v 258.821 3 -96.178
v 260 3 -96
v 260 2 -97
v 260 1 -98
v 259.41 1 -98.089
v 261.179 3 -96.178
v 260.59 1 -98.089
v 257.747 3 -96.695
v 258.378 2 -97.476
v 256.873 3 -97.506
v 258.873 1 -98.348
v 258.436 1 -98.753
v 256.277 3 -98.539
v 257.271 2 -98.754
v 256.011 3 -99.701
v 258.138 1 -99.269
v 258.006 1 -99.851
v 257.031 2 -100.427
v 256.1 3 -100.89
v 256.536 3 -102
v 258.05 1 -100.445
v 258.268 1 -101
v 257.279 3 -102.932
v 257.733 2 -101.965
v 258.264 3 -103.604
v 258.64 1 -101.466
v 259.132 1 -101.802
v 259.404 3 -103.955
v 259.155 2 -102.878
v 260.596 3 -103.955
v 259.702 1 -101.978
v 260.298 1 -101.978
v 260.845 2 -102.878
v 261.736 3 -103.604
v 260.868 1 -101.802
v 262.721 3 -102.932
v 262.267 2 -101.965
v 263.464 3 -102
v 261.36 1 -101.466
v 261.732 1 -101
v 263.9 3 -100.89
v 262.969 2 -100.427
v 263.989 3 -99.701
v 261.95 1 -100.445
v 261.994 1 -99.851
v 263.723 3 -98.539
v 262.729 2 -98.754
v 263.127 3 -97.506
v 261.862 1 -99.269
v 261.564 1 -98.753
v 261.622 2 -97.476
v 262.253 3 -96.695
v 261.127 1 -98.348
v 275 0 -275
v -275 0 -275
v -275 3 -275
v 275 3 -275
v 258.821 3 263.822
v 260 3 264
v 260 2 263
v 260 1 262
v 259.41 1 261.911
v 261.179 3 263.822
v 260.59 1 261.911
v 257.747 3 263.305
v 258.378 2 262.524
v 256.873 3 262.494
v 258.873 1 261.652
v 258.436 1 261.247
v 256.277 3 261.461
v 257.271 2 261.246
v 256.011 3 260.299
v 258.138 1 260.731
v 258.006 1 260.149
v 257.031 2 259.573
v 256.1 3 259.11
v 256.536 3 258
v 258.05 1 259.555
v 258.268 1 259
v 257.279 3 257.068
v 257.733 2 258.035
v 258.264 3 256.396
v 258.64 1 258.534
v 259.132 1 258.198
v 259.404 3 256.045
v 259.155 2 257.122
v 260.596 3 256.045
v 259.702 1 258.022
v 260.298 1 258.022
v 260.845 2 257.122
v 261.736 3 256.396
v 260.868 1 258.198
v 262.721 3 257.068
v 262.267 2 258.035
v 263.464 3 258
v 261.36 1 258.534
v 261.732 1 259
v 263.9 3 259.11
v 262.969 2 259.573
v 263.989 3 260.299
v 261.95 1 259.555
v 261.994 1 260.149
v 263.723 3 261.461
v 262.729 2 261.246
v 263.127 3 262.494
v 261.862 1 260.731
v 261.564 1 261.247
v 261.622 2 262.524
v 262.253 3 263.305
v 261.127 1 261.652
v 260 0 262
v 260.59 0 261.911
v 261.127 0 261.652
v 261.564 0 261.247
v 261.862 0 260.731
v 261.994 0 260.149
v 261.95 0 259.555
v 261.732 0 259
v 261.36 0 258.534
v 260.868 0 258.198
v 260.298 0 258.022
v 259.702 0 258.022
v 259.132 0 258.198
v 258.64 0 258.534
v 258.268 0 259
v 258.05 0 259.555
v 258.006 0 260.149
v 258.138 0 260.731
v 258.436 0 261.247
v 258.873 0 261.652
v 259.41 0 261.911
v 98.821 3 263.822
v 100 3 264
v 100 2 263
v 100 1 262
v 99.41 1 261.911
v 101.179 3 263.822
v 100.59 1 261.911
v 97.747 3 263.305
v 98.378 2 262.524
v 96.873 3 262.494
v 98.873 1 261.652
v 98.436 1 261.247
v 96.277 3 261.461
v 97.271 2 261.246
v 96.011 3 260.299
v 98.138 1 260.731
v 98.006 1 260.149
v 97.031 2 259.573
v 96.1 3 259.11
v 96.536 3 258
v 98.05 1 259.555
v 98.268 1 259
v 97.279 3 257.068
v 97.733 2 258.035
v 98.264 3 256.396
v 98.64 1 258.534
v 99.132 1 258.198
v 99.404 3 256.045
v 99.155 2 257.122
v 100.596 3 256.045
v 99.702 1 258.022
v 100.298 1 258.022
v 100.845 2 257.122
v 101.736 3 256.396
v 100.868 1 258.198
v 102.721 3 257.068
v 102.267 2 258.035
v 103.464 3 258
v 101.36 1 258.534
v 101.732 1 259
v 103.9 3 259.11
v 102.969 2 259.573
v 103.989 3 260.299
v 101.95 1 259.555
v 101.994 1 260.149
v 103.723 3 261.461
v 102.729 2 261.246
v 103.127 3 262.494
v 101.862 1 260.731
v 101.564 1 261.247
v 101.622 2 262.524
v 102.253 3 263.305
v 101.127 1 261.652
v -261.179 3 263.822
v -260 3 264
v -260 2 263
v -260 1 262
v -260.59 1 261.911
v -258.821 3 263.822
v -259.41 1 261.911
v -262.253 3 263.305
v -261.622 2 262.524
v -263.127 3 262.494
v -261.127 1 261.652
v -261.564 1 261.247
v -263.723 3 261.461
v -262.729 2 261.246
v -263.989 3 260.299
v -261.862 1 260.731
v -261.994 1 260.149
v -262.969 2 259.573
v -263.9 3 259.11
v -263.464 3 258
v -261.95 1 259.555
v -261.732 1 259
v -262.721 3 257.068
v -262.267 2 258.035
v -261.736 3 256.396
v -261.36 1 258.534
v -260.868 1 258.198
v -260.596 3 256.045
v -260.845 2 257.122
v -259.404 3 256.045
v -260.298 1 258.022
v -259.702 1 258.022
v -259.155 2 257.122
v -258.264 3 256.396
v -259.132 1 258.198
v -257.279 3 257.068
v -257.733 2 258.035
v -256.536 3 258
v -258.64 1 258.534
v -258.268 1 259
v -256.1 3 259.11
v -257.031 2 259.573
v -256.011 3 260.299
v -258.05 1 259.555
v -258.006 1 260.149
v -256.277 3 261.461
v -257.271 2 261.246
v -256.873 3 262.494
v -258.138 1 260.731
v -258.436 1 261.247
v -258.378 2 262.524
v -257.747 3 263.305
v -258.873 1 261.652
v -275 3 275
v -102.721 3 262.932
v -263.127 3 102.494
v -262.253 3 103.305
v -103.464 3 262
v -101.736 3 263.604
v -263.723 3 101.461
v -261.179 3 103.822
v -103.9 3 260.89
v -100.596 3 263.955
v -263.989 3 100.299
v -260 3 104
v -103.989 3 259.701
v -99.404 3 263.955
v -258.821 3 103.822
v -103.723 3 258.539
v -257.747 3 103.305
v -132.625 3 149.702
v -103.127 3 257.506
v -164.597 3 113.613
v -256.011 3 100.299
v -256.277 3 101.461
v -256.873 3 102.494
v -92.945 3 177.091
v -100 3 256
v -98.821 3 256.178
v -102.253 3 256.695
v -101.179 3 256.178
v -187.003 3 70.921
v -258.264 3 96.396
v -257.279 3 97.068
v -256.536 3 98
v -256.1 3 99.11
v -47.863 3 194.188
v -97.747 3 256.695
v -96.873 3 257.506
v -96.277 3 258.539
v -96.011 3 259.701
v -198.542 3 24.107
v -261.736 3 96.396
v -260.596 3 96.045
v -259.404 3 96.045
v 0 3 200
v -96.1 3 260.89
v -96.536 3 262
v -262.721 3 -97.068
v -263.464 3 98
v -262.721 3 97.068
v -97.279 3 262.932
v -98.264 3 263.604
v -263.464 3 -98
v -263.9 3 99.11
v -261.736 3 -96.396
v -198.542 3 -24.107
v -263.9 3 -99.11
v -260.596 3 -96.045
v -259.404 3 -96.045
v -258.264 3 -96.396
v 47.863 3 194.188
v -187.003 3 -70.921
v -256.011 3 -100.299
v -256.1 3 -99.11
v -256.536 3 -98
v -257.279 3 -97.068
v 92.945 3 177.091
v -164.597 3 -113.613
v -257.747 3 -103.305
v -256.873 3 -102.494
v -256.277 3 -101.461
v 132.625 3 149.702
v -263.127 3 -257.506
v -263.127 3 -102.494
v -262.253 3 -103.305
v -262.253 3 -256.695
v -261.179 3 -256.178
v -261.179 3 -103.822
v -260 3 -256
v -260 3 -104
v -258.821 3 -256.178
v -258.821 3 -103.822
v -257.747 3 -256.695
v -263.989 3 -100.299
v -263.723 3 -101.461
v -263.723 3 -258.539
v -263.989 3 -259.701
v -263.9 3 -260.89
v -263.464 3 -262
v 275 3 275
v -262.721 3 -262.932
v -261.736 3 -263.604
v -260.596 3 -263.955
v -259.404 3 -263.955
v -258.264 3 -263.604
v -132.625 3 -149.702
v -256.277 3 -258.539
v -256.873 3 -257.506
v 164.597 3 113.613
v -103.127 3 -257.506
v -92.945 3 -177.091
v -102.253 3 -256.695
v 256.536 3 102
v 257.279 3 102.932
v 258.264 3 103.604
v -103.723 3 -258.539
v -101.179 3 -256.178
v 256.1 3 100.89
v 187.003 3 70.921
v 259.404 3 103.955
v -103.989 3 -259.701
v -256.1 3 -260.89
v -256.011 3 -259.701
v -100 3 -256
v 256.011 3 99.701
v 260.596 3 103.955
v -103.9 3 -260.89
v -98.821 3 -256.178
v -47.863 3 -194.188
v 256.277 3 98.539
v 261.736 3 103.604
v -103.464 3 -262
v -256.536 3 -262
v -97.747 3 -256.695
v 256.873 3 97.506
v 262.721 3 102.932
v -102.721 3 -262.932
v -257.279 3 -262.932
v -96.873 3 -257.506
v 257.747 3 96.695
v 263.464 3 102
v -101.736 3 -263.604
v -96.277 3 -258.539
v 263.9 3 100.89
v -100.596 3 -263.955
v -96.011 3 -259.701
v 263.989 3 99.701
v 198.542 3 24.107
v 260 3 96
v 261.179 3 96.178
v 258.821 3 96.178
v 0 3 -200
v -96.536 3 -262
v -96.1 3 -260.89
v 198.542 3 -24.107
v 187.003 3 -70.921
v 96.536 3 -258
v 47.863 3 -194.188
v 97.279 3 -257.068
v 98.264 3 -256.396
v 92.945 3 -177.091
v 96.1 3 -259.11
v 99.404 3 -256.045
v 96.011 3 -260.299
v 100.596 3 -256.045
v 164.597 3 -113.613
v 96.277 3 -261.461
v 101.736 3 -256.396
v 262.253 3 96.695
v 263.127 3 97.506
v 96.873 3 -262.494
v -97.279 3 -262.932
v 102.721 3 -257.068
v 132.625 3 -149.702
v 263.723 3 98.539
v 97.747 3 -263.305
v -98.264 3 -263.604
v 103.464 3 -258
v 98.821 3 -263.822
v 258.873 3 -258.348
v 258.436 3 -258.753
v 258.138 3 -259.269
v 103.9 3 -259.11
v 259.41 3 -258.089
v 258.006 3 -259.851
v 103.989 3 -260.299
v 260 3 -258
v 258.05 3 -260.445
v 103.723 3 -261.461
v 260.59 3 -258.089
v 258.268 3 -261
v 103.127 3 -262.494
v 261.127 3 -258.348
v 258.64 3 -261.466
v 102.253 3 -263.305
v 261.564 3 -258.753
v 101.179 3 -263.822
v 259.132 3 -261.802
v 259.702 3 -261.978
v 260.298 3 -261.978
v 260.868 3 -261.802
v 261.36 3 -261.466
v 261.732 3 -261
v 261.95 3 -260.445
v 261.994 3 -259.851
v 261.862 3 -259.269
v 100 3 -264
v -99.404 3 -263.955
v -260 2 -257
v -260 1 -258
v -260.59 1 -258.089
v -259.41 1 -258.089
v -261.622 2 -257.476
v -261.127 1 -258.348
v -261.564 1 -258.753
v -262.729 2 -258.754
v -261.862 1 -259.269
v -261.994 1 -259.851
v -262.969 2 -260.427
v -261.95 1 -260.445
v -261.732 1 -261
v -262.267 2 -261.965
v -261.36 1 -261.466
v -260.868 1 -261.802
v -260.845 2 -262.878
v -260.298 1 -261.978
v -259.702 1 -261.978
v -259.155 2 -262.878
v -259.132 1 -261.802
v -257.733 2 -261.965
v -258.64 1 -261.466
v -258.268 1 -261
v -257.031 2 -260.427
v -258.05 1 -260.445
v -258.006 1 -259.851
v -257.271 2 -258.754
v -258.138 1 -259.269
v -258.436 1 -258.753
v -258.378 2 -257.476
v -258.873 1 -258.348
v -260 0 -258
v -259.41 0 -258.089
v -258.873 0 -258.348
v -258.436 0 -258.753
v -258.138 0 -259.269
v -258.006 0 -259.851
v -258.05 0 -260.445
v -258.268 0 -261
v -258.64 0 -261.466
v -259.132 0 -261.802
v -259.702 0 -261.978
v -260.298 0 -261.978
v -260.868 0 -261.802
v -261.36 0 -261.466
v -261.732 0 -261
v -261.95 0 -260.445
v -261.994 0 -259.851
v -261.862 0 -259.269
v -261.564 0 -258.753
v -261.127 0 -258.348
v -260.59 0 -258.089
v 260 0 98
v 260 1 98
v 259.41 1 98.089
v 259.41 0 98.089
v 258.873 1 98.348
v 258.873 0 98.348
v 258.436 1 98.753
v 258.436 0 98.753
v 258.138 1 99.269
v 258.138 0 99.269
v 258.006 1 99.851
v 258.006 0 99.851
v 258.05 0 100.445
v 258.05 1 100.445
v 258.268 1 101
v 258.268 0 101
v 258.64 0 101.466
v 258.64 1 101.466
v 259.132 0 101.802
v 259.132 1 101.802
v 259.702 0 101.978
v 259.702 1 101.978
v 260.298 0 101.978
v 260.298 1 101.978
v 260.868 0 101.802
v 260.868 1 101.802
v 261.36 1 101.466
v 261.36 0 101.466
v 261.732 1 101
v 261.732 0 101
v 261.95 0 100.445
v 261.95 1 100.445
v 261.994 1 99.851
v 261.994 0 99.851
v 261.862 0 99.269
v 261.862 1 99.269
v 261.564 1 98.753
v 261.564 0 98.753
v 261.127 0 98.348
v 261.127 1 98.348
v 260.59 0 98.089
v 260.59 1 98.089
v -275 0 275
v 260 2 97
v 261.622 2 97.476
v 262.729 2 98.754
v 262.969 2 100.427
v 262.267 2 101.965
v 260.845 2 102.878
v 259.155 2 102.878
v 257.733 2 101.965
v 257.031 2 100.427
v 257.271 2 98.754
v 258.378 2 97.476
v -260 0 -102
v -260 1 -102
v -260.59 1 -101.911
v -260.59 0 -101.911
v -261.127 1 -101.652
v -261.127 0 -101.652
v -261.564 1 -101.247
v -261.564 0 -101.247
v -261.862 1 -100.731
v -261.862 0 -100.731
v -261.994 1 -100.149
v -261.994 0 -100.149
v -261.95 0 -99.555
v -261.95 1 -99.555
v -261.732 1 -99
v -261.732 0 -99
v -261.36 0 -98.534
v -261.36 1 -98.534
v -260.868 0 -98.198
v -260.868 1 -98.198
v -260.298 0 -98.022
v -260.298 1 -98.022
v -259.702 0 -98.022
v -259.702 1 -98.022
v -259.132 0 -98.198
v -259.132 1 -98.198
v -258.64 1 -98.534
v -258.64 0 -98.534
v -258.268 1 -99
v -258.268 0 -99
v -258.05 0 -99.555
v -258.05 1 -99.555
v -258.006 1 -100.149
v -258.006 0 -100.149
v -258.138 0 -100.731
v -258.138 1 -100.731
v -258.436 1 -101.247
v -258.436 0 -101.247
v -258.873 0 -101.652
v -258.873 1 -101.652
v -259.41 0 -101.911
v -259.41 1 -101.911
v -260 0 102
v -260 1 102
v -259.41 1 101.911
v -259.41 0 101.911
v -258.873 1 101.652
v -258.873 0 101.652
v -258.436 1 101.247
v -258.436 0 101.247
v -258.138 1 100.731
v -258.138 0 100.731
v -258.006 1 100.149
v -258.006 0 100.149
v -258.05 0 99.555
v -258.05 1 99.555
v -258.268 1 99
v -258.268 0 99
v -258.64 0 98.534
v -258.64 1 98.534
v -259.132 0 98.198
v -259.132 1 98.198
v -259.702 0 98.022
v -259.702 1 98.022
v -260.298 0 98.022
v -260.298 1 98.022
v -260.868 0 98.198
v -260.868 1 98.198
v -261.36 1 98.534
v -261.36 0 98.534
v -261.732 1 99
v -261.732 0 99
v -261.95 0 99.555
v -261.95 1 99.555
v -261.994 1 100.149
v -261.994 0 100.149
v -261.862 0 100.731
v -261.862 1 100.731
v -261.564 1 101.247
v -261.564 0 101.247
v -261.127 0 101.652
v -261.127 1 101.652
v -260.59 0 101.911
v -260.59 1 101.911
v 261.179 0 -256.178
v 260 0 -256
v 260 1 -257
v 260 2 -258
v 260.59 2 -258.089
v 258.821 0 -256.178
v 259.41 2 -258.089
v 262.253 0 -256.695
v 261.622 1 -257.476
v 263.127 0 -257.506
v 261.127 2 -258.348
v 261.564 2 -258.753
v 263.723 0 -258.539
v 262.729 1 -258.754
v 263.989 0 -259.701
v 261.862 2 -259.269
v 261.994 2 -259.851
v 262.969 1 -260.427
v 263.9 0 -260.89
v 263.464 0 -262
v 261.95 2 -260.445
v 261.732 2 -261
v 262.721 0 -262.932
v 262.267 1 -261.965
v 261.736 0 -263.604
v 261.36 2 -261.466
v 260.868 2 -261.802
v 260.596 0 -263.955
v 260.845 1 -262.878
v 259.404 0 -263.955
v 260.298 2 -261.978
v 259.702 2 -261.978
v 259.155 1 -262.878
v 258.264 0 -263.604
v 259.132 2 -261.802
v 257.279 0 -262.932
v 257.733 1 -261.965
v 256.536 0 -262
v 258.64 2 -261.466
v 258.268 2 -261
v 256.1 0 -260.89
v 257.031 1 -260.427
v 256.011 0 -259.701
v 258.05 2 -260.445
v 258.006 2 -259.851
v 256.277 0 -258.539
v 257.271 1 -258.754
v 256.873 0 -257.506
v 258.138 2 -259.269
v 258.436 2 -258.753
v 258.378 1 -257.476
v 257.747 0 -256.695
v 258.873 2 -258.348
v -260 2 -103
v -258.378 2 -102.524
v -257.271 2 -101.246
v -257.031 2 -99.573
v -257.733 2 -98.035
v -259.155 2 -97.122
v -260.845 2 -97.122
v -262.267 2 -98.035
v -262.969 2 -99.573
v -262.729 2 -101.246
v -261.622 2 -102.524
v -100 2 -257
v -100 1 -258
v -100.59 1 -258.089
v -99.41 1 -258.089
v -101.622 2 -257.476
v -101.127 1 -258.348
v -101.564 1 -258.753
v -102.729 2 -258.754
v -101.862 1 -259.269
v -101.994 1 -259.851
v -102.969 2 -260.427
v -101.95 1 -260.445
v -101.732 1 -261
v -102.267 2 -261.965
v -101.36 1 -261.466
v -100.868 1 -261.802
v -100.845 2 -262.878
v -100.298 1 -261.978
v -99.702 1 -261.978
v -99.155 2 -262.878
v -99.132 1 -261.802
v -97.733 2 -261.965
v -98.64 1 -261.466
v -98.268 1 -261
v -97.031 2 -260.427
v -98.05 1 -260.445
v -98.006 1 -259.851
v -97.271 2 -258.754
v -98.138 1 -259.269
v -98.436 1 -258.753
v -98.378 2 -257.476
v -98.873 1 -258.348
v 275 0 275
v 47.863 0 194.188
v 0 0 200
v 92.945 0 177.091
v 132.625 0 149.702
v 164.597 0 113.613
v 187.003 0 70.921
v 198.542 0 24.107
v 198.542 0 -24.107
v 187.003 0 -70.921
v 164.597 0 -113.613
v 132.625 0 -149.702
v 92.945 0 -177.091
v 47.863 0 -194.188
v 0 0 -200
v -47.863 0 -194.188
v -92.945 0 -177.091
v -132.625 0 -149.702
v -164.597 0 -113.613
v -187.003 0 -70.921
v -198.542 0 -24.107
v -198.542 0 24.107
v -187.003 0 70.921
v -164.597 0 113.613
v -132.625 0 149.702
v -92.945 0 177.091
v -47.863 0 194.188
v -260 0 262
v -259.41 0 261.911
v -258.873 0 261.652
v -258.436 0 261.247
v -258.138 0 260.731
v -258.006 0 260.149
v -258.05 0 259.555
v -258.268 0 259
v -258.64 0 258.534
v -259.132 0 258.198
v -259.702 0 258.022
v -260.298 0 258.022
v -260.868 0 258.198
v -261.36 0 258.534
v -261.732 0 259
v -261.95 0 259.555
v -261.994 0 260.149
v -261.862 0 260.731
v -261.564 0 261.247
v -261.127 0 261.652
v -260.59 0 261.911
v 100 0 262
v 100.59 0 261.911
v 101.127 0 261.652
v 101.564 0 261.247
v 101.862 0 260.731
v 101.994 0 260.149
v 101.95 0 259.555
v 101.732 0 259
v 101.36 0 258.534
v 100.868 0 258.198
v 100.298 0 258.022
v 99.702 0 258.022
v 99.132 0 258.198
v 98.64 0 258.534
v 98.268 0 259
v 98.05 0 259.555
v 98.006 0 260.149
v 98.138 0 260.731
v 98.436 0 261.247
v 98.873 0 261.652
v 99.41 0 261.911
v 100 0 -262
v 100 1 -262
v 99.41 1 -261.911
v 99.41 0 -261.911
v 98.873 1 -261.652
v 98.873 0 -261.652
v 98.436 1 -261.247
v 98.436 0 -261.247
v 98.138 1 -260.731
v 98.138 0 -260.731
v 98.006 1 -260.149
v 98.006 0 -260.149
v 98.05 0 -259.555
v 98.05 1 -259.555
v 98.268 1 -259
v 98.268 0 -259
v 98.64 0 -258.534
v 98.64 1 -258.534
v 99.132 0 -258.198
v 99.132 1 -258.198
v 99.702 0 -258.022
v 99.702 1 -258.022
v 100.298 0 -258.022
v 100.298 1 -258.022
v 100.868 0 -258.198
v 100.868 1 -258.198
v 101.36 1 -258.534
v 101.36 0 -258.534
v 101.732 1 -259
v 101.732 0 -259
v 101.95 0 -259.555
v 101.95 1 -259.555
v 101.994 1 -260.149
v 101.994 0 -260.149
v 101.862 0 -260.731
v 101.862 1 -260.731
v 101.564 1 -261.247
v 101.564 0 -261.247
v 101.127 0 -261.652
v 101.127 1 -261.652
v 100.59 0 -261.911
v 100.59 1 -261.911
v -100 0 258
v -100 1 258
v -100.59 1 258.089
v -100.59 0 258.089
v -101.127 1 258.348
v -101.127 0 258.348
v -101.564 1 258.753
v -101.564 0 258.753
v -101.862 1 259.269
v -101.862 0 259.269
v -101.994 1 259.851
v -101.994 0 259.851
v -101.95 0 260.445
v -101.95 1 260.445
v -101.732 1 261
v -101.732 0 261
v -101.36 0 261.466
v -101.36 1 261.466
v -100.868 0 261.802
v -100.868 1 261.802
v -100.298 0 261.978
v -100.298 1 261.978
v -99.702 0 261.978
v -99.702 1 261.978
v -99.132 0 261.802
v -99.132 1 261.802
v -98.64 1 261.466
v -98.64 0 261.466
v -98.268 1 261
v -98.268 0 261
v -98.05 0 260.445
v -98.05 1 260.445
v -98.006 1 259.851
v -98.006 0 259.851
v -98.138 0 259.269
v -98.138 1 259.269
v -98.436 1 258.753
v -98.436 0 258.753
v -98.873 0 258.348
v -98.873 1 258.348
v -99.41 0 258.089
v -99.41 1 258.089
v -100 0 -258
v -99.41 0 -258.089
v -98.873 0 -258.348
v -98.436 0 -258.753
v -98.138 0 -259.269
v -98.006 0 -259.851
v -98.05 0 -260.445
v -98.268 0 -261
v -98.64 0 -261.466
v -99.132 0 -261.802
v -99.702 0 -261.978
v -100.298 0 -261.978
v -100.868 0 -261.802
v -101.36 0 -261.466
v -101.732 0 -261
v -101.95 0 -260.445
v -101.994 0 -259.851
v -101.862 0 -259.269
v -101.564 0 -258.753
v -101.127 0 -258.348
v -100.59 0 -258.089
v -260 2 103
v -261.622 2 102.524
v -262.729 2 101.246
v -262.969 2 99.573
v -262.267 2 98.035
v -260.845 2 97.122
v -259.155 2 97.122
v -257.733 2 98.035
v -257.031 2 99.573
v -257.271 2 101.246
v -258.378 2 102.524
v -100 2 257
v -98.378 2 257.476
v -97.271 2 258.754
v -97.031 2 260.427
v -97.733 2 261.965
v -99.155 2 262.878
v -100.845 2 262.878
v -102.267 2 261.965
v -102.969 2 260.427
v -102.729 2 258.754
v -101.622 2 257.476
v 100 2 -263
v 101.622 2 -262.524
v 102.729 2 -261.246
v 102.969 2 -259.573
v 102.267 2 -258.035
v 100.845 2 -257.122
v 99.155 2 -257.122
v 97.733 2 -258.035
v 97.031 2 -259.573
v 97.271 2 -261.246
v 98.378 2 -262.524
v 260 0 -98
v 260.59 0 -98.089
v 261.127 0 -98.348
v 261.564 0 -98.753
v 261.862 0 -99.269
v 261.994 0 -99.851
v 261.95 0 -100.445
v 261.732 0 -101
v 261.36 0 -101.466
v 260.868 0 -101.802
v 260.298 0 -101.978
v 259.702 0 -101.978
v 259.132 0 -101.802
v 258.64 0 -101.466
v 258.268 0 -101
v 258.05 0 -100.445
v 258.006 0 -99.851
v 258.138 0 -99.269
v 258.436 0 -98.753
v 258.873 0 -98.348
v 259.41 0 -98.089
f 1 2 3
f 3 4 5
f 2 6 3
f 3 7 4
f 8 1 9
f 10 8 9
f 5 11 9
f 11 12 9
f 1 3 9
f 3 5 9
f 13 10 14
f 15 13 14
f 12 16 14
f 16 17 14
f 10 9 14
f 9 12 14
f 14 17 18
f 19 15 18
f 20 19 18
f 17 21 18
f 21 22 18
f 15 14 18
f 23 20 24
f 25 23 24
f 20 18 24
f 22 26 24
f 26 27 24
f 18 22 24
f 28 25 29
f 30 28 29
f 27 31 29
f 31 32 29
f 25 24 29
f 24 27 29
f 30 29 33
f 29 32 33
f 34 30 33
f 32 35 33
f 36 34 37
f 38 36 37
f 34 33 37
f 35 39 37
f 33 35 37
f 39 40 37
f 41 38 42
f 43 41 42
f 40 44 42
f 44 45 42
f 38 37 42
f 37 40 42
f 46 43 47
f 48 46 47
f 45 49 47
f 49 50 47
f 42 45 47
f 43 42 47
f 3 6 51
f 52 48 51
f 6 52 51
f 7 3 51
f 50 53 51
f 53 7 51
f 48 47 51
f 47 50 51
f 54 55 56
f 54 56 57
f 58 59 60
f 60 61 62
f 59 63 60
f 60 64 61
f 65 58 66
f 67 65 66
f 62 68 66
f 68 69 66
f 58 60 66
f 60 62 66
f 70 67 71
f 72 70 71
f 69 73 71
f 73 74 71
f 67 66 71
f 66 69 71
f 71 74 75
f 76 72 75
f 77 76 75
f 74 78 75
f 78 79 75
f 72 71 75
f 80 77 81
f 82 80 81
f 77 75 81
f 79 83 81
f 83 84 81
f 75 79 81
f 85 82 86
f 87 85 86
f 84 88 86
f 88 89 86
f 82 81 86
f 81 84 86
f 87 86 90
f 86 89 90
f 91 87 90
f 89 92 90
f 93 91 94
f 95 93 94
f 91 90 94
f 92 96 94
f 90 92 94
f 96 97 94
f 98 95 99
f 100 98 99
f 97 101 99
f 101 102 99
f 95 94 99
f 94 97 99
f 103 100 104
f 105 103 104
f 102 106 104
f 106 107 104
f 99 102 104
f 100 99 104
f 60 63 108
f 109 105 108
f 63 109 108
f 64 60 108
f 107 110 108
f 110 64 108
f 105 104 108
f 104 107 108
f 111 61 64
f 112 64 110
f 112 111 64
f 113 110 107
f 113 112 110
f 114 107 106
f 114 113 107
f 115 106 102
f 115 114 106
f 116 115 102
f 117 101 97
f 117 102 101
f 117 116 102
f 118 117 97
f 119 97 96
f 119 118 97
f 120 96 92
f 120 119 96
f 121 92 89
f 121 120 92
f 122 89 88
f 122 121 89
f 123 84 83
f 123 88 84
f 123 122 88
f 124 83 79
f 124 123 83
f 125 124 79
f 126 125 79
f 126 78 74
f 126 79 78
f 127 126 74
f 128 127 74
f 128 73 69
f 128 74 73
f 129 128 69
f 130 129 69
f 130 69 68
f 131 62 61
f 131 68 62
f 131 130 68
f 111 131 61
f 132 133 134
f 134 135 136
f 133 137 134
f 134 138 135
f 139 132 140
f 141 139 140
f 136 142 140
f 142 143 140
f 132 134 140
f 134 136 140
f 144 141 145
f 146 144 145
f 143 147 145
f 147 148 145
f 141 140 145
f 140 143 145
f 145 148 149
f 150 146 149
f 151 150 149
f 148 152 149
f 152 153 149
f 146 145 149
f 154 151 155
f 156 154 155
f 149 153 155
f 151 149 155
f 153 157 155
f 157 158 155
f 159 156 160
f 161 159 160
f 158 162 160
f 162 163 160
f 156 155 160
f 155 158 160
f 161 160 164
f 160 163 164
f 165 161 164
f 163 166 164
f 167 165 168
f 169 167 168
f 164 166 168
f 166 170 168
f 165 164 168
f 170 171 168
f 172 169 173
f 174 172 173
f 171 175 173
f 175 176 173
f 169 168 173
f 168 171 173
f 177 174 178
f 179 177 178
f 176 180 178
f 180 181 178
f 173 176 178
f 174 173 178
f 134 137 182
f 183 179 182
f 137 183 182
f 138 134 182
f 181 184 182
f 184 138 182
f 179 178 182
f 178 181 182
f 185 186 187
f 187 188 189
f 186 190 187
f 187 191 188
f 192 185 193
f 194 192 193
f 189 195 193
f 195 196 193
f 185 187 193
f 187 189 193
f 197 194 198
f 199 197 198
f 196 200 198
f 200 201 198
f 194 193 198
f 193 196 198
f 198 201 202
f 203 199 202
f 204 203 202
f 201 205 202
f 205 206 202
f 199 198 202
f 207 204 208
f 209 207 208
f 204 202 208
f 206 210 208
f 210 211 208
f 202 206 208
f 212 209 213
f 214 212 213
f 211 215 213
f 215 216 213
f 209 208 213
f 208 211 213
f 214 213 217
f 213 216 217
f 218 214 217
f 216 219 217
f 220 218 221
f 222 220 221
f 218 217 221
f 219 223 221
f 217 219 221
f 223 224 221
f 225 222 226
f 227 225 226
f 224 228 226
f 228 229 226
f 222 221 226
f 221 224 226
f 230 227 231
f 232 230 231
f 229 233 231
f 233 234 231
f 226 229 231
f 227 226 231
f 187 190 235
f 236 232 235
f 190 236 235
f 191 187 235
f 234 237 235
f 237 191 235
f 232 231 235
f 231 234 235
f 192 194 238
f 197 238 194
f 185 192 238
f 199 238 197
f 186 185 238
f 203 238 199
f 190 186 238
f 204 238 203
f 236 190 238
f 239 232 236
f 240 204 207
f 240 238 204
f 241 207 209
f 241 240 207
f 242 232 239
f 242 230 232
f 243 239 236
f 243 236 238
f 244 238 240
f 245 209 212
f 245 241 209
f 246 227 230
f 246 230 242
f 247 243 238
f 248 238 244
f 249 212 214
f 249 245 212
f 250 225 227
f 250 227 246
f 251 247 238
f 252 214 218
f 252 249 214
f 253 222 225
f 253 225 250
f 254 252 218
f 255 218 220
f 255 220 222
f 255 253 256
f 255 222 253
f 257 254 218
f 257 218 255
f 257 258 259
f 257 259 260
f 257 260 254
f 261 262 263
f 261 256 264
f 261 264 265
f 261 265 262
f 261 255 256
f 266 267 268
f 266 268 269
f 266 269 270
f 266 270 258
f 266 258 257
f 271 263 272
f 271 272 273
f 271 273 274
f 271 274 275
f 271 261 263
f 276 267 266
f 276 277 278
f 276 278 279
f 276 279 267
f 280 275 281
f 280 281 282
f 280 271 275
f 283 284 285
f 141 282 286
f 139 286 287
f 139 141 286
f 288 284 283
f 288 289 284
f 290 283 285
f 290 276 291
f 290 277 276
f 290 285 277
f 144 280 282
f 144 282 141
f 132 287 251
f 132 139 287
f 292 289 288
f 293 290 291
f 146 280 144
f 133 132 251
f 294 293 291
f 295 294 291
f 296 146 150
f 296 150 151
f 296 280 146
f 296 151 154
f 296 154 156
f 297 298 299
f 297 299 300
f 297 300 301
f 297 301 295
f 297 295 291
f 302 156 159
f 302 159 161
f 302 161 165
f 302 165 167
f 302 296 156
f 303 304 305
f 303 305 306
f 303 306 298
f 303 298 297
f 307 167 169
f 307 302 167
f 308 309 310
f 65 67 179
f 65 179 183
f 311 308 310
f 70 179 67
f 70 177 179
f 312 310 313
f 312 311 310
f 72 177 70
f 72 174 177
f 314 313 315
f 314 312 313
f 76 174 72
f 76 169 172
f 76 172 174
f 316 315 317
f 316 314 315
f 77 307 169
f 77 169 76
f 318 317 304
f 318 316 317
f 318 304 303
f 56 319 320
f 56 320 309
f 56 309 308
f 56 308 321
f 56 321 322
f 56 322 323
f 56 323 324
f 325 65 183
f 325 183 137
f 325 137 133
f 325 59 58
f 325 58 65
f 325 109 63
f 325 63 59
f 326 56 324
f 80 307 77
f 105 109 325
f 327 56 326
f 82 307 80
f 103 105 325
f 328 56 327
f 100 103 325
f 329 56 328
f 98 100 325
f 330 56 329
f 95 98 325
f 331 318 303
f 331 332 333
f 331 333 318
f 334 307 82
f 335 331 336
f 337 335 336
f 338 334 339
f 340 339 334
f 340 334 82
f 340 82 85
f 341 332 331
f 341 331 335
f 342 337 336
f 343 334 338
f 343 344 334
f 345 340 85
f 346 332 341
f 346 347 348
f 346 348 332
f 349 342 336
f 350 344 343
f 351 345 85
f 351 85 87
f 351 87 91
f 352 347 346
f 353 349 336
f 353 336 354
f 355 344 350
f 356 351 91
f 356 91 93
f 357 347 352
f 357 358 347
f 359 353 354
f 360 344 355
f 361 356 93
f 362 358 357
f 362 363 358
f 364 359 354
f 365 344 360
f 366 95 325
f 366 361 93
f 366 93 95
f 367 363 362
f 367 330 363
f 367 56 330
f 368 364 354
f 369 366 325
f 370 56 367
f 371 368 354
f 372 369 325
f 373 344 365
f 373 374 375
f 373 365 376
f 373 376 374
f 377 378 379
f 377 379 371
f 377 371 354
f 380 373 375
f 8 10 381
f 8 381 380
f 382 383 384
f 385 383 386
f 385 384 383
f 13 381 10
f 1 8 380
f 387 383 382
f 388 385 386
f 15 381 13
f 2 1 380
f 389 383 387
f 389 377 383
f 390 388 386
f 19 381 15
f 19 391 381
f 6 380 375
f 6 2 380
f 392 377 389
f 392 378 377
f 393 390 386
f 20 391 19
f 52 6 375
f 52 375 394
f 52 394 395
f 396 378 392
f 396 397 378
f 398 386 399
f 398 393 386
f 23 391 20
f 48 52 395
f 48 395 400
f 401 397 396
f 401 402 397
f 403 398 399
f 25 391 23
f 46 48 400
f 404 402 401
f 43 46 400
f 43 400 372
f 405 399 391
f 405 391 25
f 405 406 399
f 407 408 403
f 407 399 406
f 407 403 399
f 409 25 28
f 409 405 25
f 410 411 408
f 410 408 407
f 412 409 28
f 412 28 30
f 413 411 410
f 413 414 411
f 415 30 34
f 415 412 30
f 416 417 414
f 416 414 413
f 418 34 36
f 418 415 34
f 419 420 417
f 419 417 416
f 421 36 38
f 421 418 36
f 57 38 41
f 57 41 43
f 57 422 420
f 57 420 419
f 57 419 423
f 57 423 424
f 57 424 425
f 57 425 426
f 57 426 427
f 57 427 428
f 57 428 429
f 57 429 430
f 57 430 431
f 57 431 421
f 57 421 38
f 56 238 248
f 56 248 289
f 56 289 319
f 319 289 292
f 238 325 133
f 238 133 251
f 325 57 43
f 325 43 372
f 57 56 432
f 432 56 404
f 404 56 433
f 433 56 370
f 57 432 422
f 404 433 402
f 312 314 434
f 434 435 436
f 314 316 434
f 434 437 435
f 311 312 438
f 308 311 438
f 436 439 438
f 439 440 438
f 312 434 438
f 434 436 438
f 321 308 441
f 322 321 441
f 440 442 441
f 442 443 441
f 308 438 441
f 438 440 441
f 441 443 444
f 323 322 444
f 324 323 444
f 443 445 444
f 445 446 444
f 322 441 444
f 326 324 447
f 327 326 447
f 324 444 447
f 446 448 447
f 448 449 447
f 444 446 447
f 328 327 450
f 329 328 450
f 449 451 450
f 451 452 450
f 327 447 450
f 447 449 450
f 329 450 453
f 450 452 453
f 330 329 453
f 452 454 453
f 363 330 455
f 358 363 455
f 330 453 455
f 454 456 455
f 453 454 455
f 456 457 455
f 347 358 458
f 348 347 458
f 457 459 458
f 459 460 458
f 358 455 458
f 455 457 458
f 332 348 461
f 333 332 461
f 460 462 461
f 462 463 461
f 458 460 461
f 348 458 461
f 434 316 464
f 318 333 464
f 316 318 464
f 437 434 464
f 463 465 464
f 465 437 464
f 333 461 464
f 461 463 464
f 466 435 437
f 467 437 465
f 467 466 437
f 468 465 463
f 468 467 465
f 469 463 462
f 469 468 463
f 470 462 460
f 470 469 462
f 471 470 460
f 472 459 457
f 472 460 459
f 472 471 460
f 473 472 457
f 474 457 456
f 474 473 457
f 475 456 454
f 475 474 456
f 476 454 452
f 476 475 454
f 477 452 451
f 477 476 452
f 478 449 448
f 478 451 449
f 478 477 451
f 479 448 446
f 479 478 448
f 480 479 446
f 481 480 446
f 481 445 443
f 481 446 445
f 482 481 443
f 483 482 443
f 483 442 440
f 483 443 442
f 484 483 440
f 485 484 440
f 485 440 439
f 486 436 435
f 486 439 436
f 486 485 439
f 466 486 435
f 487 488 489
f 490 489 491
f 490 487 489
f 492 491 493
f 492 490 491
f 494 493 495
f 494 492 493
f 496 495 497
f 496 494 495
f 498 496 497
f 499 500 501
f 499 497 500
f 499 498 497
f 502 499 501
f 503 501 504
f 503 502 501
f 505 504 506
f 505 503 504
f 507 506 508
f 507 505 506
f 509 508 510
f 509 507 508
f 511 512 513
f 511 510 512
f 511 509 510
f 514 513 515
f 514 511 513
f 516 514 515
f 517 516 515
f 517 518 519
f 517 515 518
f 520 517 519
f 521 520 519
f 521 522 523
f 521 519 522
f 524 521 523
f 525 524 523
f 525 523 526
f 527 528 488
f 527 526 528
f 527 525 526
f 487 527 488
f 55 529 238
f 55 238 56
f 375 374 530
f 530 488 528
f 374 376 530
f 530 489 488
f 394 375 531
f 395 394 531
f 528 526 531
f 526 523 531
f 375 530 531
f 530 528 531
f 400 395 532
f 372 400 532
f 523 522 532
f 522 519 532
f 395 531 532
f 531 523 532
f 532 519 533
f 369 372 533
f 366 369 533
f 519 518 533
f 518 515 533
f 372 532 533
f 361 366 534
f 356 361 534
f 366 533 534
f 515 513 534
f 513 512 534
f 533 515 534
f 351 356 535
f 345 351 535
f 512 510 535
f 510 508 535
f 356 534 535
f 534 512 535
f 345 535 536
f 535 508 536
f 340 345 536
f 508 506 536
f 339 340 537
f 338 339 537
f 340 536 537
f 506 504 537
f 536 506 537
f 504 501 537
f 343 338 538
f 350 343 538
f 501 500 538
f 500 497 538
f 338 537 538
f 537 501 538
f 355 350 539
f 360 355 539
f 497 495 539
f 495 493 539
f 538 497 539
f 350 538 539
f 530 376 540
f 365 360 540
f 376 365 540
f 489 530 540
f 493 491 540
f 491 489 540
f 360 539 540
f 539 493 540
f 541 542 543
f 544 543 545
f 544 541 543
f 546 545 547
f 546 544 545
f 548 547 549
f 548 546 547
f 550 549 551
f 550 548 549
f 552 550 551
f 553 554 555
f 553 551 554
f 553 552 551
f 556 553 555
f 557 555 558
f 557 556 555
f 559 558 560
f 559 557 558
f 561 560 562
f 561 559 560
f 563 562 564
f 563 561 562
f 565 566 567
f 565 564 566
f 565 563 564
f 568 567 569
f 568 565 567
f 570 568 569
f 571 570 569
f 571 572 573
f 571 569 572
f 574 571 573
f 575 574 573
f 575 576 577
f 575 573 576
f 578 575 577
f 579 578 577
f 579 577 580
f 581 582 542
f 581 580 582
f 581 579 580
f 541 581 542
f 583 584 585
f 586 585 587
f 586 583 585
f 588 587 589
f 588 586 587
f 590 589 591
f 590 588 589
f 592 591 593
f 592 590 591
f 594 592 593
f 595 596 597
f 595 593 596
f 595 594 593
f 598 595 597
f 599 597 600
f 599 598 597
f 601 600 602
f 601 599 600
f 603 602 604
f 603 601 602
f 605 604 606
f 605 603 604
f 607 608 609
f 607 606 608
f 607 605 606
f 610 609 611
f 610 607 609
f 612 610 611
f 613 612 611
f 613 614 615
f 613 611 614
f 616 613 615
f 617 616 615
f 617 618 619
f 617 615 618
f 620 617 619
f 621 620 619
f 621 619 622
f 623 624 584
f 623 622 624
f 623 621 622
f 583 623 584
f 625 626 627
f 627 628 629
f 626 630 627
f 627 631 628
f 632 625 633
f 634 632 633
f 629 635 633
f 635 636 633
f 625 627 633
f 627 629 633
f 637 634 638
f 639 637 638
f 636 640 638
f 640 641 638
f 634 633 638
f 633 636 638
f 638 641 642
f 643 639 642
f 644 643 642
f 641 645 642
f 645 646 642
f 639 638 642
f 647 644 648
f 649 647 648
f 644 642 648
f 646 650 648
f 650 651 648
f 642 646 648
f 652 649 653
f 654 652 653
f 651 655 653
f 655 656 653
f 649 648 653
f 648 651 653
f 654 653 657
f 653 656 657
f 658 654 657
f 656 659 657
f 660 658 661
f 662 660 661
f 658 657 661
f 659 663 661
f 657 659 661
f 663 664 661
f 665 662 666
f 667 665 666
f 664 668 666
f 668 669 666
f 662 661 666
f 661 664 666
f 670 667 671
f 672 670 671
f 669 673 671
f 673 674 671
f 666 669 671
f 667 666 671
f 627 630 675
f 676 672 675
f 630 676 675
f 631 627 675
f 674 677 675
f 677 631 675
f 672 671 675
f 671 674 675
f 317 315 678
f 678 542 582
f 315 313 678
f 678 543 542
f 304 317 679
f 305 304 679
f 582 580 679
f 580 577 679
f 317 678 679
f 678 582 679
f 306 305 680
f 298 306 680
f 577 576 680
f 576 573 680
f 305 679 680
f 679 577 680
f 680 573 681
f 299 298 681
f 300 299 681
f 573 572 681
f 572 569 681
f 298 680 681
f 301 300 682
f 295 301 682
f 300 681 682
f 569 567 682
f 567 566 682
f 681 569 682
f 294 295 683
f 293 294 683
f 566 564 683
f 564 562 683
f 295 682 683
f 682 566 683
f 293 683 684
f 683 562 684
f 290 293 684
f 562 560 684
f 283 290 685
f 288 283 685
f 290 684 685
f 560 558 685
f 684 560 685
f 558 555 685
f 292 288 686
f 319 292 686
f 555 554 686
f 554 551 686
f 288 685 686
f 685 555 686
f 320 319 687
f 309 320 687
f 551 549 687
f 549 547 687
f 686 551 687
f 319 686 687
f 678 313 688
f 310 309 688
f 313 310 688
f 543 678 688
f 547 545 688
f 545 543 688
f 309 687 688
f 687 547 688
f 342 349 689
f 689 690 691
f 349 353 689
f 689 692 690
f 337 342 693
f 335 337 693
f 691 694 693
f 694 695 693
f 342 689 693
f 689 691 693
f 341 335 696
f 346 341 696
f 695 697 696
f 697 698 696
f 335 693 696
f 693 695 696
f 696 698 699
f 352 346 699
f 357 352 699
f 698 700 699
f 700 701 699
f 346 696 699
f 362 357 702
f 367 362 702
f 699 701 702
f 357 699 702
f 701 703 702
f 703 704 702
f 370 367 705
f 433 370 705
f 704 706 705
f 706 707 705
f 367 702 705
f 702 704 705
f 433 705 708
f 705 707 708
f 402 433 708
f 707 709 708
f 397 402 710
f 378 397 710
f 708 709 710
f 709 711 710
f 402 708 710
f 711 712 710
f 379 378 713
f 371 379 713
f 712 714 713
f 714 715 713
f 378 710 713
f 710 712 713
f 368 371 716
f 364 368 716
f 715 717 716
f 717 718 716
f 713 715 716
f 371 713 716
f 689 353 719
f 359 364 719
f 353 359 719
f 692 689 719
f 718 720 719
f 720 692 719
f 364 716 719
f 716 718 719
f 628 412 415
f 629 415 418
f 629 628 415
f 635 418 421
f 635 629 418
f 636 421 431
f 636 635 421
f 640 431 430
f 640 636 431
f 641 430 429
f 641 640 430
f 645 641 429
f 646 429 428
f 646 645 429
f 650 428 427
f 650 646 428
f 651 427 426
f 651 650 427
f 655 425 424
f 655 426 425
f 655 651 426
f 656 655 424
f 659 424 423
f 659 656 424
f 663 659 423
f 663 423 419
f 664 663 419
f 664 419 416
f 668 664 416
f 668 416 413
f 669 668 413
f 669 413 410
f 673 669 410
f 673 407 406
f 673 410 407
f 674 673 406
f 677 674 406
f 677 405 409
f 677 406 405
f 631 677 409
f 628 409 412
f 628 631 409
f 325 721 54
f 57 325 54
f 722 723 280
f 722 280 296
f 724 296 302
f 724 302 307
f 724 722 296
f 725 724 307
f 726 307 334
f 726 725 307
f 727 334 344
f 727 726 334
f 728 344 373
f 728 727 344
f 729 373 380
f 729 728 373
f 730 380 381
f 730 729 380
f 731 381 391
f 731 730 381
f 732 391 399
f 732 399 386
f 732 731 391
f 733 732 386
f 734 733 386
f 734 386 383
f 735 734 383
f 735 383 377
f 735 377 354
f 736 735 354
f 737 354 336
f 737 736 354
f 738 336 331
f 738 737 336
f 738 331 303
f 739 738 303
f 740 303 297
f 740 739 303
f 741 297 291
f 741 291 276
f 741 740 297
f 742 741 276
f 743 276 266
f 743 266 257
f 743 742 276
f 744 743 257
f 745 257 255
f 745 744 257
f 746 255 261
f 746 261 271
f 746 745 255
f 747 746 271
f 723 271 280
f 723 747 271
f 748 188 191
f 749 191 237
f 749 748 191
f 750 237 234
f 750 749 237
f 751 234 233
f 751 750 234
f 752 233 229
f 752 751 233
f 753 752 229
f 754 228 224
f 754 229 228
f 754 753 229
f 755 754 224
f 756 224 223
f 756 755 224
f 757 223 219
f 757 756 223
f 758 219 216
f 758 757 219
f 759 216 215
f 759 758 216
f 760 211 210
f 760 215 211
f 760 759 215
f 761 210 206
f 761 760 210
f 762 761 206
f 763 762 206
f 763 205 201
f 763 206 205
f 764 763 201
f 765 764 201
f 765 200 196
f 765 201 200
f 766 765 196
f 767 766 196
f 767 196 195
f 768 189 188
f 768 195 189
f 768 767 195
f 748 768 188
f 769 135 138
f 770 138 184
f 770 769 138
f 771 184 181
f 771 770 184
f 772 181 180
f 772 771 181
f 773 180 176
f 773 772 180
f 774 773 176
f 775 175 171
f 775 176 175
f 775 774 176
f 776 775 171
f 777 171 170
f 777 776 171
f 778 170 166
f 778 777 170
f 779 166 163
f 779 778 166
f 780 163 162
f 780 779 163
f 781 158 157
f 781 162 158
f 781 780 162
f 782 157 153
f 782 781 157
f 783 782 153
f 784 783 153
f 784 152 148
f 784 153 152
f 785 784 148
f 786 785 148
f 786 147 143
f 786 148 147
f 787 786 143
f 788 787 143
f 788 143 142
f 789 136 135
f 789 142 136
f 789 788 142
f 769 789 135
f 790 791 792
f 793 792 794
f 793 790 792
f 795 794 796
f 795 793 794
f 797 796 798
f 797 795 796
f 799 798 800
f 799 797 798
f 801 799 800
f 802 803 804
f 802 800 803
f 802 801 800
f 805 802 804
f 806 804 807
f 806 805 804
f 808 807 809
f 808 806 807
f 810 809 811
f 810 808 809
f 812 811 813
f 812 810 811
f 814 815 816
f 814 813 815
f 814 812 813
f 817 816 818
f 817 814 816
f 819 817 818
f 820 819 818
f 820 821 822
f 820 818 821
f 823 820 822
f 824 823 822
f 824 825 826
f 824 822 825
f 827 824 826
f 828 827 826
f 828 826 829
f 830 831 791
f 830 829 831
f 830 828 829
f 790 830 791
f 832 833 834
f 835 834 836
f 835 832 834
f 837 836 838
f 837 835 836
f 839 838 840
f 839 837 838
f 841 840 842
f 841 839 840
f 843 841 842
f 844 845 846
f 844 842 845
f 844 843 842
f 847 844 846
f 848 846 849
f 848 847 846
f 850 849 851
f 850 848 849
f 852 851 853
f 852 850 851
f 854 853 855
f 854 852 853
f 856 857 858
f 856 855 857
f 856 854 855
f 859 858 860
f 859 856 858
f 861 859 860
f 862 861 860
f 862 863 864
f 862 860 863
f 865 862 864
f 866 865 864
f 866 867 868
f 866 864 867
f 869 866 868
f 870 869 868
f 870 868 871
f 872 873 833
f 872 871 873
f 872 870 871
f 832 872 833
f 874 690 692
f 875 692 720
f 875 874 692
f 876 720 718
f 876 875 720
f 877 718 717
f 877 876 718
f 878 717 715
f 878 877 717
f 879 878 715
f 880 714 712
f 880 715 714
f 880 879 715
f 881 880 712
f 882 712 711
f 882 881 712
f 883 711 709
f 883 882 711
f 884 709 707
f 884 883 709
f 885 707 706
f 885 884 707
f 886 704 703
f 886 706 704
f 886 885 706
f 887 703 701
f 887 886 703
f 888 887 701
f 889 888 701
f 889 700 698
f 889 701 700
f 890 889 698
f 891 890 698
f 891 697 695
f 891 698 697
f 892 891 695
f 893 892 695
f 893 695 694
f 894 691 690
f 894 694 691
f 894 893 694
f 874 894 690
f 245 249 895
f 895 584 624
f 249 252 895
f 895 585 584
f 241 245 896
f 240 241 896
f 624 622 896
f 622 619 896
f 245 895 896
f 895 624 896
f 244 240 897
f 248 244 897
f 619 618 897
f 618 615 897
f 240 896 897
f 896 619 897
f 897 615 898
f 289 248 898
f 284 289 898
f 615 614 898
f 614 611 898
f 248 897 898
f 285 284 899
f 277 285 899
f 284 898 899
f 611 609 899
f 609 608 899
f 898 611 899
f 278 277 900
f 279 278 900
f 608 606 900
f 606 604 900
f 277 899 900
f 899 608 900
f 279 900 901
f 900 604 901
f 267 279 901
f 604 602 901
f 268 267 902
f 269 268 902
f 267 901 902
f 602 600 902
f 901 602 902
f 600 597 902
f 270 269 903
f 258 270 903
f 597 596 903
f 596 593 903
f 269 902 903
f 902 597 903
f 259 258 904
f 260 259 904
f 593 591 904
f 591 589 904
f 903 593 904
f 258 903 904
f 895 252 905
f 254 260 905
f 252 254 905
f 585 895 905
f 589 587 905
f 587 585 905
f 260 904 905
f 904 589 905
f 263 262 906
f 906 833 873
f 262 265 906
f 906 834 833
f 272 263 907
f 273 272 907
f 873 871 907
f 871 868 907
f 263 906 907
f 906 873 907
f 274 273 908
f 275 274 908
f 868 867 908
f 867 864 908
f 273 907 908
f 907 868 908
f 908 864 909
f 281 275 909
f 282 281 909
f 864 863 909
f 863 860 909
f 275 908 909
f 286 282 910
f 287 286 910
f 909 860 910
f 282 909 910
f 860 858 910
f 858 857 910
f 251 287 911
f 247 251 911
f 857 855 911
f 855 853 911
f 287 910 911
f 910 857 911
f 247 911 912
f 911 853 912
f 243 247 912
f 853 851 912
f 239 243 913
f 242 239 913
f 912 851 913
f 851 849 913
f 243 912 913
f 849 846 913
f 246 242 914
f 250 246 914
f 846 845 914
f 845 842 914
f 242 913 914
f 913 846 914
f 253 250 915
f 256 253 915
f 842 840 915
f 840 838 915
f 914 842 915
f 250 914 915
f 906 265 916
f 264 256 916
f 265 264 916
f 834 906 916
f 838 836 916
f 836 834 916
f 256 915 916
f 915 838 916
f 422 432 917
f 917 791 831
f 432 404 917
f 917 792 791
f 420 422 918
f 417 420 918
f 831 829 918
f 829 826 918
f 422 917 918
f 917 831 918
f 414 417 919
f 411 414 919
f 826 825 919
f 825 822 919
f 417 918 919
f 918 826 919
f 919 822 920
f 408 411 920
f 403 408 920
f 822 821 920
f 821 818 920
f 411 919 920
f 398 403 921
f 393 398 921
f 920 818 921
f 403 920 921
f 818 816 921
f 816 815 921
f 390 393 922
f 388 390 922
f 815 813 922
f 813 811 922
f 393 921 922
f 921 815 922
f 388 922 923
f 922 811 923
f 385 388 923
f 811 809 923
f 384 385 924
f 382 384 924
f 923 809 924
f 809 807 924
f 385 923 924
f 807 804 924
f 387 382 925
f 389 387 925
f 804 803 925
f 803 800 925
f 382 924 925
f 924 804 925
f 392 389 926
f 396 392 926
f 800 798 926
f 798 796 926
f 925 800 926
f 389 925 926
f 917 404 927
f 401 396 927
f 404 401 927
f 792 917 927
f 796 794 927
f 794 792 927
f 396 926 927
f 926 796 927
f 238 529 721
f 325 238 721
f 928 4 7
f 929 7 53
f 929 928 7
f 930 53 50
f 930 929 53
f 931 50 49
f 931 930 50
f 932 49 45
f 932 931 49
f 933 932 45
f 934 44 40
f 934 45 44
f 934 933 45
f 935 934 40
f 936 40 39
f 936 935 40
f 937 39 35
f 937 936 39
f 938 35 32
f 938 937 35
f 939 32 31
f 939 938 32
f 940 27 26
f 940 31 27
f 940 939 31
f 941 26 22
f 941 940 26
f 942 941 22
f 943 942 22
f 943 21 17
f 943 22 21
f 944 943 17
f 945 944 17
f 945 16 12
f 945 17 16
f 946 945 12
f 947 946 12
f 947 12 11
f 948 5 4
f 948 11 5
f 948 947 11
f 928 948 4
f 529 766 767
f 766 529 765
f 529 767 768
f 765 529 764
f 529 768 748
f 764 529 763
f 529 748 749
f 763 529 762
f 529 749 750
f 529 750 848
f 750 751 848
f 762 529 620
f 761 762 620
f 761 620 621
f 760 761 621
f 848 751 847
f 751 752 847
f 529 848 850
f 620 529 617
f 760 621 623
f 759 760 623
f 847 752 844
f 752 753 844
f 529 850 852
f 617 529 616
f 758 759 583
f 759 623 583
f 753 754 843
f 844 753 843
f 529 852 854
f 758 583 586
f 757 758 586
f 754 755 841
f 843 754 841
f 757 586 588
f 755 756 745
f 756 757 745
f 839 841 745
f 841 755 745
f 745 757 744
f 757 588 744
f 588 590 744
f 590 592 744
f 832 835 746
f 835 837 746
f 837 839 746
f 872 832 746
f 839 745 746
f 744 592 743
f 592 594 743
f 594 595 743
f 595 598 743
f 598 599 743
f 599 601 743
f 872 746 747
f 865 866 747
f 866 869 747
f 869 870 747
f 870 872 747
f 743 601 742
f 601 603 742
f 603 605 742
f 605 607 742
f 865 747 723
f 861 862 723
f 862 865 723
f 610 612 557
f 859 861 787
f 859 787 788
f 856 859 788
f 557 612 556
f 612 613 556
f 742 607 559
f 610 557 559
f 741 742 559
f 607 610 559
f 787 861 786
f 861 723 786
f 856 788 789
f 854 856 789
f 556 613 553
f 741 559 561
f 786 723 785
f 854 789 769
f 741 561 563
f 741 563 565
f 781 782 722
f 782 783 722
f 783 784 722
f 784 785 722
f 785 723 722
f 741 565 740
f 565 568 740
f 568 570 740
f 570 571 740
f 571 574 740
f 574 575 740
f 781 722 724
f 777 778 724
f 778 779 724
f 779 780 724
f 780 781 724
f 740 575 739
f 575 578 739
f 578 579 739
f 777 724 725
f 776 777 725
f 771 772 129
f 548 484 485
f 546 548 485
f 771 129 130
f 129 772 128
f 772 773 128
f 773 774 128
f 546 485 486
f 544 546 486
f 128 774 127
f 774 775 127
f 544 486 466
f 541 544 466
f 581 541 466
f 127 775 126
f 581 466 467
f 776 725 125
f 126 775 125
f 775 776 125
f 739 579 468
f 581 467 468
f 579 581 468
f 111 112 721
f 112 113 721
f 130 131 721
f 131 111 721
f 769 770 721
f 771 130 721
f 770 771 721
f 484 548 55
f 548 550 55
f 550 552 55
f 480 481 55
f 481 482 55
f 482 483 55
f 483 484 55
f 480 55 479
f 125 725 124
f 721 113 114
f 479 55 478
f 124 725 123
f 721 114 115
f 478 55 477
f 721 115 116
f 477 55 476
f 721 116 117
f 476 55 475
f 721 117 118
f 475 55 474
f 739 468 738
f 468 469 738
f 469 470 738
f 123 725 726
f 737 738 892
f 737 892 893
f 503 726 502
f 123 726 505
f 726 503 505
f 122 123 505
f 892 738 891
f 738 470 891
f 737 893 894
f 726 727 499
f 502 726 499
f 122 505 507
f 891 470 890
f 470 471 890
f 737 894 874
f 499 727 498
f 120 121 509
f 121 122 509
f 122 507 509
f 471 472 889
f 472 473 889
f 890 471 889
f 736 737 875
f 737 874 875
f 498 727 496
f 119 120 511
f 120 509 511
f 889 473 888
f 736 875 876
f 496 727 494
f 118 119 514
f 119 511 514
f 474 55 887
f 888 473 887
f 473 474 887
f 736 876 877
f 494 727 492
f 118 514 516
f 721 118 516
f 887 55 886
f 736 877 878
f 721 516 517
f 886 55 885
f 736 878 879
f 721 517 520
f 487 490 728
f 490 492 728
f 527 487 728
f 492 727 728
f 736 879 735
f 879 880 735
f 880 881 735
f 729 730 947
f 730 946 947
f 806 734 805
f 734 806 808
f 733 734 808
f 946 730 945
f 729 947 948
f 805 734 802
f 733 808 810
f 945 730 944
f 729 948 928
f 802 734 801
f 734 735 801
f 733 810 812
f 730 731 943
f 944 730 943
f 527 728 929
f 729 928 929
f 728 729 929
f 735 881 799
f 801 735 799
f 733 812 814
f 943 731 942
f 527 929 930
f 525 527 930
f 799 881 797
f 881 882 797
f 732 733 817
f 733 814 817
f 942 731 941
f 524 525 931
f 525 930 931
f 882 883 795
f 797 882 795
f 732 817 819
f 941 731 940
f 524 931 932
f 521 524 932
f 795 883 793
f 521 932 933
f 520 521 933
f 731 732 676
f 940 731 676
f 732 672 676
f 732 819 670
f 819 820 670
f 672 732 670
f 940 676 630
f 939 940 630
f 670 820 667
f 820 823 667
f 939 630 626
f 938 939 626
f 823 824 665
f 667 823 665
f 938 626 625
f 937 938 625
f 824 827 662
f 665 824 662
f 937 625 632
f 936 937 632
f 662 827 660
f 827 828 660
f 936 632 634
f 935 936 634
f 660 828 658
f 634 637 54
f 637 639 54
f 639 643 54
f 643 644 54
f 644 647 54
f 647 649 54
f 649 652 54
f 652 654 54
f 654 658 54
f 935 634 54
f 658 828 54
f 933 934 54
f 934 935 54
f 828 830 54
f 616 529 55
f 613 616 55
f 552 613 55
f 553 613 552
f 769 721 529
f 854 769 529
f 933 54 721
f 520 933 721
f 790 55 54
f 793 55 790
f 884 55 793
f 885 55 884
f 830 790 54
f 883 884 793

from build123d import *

# Parameters (mm, degrees)
SKETCH_1_W          = 550
SKETCH_1_H          = 550
SKETCH_1_R          = 200
EXTRUDE_1_DEPTH     = 3
SKETCH_2_R          = 2
CUT_EXTRUDE_1_DEPTH = 389.920300319
CHAMFER_1_SIZE      = 2


with BuildPart() as part:
    # 草图1 → 凸台-拉伸1 (new body)
    with BuildSketch(Plane(origin=(0, 0, 0), x_dir=(1, 0, 0), z_dir=(0, 1, 0))):
        Rectangle(SKETCH_1_W, SKETCH_1_H)
        with Locations(Location((0, 0, 0), (0, 0, 270))):
            Circle(SKETCH_1_R, mode=Mode.SUBTRACT)
    extrude(amount=EXTRUDE_1_DEPTH)

    # 草图2 → 切除-拉伸1 (cut, through all)
    with BuildSketch(Plane(origin=(0, 0, 0), x_dir=(1, 0, 0), z_dir=(0, 1, 0))):
        with Locations(Location((-260, 260, 0), (0, 0, 270))):
            Circle(SKETCH_2_R)
        with Locations(Location((-100, 260, 0), (0, 0, 270))):
            Circle(SKETCH_2_R)
        with Locations(Location((100, 260, 0), (0, 0, 90))):
            Circle(SKETCH_2_R)
        with Locations(Location((260, -100, 0), (0, 0, 90))):
            Circle(SKETCH_2_R)
        with Locations(Location((260, 100, 0), (0, 0, 270))):
            Circle(SKETCH_2_R)
        with Locations(Location((260, 260, 0), (0, 0, 270))):
            Circle(SKETCH_2_R)
        with Locations(Location((-100, -260, 0), (0, 0, 90))):
            Circle(SKETCH_2_R)
        with Locations(Location((100, -260, 0), (0, 0, 270))):
            Circle(SKETCH_2_R)
        with Locations(Location((260, -260, 0), (0, 0, 270))):
            Circle(SKETCH_2_R)
        with Locations(Location((-260, 100, 0), (0, 0, 90))):
            Circle(SKETCH_2_R)
        with Locations(Location((-260, -100, 0), (0, 0, 270))):
            Circle(SKETCH_2_R)
        with Locations(Location((-260, -260, 0), (0, 0, 270))):
            Circle(SKETCH_2_R)
    extrude(amount=CUT_EXTRUDE_1_DEPTH, mode=Mode.SUBTRACT)

    # 倒角1
    chamfer_1_edges = [part.edges().sort_by_distance(p)[0] for p in [
        (-260, 3, -98),
        (-260, 3, 98),
        (-260, 3, 258),
        (-100, 3, 262),
        (100, 3, 258),
        (260, 3, 258),
        (260, 3, 102),
        (260, 3, -102),
        (260, 0, -262),
        (100, 3, -258),
        (-100, 3, -262),
        (-260, 3, -262),
    ]]
    chamfer(chamfer_1_edges, length=CHAMFER_1_SIZE)


solid = part.part
